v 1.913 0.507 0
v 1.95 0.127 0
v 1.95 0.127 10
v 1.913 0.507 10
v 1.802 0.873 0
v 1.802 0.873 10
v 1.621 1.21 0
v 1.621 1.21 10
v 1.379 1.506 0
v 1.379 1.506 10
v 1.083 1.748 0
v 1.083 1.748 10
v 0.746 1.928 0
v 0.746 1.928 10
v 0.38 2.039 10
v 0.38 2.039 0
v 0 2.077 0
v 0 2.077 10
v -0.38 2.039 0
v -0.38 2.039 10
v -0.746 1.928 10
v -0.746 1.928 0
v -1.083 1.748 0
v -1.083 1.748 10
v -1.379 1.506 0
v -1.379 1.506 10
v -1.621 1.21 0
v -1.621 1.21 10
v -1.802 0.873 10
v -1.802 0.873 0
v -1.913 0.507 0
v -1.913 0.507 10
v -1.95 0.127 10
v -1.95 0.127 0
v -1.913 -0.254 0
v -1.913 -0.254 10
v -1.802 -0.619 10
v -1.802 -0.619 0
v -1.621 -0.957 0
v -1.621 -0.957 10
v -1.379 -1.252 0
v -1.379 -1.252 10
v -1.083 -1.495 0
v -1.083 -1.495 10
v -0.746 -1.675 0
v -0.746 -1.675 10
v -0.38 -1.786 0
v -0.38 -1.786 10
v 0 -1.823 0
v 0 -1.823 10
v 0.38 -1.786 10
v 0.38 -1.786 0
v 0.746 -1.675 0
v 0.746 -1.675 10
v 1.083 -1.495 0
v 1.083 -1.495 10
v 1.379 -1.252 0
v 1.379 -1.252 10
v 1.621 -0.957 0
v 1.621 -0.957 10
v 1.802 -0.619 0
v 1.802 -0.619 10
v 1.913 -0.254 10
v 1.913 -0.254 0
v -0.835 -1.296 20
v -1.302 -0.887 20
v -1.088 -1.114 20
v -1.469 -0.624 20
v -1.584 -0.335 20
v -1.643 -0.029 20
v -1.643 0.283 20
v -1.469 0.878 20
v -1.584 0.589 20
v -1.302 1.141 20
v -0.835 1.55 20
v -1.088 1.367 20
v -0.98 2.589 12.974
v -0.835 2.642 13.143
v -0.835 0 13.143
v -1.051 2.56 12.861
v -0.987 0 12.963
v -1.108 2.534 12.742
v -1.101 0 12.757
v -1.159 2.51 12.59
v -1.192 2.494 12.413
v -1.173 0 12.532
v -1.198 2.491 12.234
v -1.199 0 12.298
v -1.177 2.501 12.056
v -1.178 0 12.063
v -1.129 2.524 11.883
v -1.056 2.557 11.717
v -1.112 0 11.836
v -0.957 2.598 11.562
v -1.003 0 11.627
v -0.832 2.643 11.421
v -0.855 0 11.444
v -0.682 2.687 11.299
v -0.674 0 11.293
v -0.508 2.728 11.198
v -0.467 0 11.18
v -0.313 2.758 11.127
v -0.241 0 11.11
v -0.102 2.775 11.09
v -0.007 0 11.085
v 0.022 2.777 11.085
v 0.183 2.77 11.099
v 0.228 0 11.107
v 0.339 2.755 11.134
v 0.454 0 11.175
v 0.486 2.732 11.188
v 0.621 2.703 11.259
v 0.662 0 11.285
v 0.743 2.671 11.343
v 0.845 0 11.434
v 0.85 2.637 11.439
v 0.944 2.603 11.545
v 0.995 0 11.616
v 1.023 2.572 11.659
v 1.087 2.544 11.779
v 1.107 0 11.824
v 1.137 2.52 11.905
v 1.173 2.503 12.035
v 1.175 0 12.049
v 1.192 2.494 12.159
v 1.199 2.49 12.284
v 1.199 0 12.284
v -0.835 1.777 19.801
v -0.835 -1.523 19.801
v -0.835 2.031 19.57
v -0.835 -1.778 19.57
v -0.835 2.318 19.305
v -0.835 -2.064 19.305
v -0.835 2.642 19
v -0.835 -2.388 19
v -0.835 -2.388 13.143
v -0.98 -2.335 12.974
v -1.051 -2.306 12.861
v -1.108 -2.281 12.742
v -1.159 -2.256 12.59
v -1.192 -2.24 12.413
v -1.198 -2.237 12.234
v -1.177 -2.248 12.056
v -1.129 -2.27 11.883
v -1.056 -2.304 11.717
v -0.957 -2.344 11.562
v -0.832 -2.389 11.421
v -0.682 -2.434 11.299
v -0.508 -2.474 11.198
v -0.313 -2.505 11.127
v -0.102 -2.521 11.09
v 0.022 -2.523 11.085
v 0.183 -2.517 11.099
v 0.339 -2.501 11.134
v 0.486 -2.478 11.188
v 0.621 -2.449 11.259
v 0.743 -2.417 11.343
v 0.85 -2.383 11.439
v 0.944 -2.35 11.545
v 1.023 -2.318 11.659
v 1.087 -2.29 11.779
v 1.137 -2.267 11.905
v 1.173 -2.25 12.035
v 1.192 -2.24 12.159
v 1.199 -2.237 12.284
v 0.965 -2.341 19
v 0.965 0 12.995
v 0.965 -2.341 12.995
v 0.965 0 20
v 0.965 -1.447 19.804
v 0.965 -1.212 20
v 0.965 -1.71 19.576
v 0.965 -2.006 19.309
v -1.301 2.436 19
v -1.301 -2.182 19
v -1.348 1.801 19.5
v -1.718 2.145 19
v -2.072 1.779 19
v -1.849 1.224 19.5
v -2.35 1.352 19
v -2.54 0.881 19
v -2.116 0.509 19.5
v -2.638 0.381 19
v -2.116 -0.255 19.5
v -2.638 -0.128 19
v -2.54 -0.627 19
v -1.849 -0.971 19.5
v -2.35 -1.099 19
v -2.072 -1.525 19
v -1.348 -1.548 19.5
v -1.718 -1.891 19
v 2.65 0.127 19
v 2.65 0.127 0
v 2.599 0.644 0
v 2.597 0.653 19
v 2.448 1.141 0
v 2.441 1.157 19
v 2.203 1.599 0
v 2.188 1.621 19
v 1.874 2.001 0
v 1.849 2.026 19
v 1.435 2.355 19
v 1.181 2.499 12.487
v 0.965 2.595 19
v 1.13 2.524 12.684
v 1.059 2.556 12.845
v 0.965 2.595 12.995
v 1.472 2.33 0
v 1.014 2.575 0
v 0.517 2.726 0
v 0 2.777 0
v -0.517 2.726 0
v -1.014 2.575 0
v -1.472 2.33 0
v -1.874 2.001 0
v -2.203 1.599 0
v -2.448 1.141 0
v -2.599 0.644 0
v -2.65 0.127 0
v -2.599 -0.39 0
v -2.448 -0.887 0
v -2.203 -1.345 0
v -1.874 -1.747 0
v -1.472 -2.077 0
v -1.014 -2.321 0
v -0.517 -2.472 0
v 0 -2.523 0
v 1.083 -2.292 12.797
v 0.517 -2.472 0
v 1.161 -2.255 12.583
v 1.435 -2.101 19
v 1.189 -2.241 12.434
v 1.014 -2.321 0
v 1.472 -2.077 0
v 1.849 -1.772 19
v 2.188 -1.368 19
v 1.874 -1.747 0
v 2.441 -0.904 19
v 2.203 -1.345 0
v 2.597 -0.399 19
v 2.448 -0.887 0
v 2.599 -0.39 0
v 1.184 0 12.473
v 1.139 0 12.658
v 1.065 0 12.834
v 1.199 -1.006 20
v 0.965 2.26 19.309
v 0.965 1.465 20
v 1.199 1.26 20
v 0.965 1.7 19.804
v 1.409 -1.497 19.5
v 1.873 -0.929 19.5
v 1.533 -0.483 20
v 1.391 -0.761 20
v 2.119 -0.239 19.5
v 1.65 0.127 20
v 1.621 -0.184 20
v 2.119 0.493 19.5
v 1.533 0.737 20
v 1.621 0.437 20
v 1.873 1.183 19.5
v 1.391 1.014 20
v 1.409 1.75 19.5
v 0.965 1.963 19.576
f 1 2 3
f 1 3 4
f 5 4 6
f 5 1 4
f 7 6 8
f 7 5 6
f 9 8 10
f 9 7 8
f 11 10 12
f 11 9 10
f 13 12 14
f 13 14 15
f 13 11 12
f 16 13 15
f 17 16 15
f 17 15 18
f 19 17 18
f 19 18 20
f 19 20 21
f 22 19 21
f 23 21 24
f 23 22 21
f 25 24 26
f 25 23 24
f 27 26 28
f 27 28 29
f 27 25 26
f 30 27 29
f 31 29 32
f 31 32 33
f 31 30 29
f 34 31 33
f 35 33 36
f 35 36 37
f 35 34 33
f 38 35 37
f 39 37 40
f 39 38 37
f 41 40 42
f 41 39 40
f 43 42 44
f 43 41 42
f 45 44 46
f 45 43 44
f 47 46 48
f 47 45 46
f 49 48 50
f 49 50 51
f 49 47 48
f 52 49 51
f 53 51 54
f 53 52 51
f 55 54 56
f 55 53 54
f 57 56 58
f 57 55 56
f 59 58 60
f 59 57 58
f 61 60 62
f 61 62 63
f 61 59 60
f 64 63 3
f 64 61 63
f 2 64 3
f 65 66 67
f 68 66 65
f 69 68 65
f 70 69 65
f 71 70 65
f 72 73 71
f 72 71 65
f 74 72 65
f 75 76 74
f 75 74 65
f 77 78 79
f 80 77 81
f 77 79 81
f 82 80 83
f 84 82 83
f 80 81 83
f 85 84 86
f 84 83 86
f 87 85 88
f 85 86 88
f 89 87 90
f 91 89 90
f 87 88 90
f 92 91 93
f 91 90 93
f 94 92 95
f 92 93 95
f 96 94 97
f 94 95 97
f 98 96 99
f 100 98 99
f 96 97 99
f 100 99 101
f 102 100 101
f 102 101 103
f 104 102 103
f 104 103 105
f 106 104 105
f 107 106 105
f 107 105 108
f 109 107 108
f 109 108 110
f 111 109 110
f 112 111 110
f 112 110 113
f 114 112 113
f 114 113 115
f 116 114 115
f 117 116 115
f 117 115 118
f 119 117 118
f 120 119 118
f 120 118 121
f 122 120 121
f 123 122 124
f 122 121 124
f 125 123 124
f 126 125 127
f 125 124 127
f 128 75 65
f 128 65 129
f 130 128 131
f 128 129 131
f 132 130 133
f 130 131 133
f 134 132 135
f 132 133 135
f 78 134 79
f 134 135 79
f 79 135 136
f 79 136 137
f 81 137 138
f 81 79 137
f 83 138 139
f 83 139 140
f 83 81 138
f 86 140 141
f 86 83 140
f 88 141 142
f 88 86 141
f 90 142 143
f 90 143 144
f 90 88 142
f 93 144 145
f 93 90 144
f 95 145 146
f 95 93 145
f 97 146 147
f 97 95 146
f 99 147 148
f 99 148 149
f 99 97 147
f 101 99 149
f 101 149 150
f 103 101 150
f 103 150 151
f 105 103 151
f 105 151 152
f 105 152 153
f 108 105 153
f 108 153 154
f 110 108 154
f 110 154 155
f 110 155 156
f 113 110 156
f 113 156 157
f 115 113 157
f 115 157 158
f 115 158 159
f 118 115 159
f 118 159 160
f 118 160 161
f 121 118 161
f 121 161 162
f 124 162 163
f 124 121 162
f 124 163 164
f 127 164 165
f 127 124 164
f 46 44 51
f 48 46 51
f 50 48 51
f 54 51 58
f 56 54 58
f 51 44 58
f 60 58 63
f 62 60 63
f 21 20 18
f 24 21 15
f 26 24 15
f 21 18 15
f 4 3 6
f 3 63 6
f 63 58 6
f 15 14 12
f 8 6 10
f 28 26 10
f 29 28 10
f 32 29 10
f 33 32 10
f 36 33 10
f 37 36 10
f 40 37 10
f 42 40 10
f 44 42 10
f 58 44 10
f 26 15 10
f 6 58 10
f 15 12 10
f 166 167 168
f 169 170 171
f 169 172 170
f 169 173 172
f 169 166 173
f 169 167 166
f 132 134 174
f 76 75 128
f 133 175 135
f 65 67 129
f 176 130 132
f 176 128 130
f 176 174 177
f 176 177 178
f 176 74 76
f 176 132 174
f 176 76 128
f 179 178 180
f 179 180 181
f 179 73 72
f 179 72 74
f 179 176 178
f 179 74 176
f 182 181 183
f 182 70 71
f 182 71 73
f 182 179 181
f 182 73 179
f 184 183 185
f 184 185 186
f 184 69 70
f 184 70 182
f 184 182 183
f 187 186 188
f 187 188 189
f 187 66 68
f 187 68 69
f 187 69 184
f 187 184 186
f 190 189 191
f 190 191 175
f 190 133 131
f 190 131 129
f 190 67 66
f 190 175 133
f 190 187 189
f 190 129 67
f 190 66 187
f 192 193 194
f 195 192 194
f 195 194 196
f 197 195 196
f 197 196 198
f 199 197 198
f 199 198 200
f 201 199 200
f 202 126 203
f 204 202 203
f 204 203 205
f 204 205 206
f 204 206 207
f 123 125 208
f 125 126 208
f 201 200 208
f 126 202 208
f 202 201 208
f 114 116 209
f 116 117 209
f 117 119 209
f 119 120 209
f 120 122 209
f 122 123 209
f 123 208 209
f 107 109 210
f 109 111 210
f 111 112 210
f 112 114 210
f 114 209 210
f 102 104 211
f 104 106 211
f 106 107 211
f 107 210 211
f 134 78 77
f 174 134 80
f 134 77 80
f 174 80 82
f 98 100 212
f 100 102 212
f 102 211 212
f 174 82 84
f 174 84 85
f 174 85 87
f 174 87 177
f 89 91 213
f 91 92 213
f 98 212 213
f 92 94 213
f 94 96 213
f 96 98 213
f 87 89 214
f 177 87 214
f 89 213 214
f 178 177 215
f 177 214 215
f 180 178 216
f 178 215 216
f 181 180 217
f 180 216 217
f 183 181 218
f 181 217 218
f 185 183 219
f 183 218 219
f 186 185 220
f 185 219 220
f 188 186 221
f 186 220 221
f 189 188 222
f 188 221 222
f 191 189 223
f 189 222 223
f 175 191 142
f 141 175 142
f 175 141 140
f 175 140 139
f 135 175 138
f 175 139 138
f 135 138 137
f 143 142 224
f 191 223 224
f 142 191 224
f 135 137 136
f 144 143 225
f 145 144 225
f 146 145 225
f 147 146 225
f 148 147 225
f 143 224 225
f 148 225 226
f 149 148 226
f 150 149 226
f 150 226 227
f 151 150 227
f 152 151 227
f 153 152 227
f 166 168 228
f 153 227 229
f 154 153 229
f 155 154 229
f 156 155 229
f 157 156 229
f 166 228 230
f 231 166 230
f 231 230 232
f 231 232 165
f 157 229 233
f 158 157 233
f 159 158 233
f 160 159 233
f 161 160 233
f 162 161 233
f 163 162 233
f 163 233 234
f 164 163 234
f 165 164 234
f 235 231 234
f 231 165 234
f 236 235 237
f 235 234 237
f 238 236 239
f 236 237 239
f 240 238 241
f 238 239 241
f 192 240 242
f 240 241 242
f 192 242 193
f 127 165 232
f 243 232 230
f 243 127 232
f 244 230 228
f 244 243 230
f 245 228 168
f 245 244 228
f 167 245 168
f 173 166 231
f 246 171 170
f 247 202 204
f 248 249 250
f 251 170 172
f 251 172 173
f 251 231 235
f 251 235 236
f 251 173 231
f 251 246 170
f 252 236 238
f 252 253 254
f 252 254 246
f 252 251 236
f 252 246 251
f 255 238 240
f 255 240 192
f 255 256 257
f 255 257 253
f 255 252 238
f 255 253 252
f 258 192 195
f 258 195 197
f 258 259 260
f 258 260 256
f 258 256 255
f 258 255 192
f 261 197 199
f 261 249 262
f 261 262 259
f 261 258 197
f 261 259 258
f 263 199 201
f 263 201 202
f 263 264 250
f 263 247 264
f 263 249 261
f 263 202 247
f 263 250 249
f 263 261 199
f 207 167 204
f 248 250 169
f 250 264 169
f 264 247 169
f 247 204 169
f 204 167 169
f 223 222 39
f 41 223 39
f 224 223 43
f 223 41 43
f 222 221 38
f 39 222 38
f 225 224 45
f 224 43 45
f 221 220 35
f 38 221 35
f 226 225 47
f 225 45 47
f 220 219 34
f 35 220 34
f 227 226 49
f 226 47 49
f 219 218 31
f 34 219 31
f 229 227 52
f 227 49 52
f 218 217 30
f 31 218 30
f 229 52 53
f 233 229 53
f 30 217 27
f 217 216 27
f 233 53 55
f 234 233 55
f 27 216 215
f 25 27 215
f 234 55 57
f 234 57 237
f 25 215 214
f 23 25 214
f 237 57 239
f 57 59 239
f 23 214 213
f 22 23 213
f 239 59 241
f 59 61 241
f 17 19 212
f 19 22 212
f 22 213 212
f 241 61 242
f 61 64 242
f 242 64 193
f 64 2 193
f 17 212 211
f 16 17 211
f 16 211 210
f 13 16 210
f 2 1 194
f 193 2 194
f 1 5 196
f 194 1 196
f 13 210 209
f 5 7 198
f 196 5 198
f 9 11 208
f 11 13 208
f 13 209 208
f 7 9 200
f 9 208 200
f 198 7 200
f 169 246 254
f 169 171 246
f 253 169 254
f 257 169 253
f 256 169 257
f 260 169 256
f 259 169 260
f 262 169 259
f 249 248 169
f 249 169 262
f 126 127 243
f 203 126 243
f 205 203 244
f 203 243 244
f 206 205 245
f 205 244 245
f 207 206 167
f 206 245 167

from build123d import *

# Parameters (mm, degrees)
F0_R     = 2.65
F0_R_2   = 1.95
F1_DEPTH = 10
F2_R     = 2.65
F3_DEPTH = 10
F4_SIZE  = 1
F6_DEPTH = 2.7778161572
F7_DEPTH = 2.5241839428


with BuildPart() as f1:
    # F0 (on Top) → F1 (new body)
    with BuildSketch(Plane.XY):
        with Locations((0, 0.1268161572)):
            Circle(F0_R)
        with Locations((0, 0.1268161572)):
            Circle(F0_R_2, mode=Mode.SUBTRACT)
    extrude(amount=F1_DEPTH)

    # F2 (on face) → F3 (join)
    with BuildSketch(Plane.XY.offset(10)):
        with Locations((0, 0.1268161572)):
            Circle(F2_R)
    extrude(amount=F3_DEPTH)

    # F4
    f4_edges = [f1.edges().sort_by_distance(p)[0] for p in [
        (-2.65, 0.126816, 20),
    ]]
    chamfer(f4_edges, length=F4_SIZE)

    # F5 (on Front) → F6 (cut, through all)
    with BuildSketch(Plane.XZ):
        with BuildLine():
            Line((-0.8353080657, 13.1434470012), (-0.8353080657, 12.2838566395))
            Line((-0.8353080657, 12.2838566395), (0.9646919343, 12.2838566395))
            Line((0.9646919343, 12.2838566395), (0.9646919343, 12.9951966612))
            ThreePointArc((0.9646919343, 12.9951966612), (0.0983848931, 13.4784090943), (-0.8353080657, 13.1434470012))
        make_face()
        with BuildLine():
            Line((0.9646919343, 12.2838566395), (-0.8353080657, 12.2838566395))
            Line((-0.8353080657, 12.2838566395), (-0.8353080657, 13.1434470012))
            ThreePointArc((-0.8353080657, 13.1434470012), (-0.4666032996, 11.1798111171), (1.1985971611, 12.2838566395))
            ThreePointArc((1.1985971611, 12.2838566395), (1.1386202546, 12.6582615946), (0.9646919343, 12.9951966612))
            Line((0.9646919343, 12.9951966612), (0.9646919343, 12.2838566395))
        make_face()
        with BuildLine():
            Line((-0.8353080657, 20.0238556888), (-0.8353080657, 13.1434470012))
            ThreePointArc((-0.8353080657, 13.1434470012), (0.0983848931, 13.4784090943), (0.9646919343, 12.9951966612))
            Line((0.9646919343, 12.9951966612), (0.9646919343, 20.0238556888))
            Line((0.9646919343, 20.0238556888), (-0.8353080657, 20.0238556888))
        make_face()
    extrude(amount=-F6_DEPTH, mode=Mode.SUBTRACT)

    # F7 (cut, through all): a face of the model
    f7_faces = [f1.faces().sort_by_distance(p)[0] for p in [
        (0.0489712617, 0, 15.4729630627),
    ]]
    extrude(f7_faces, amount=-F7_DEPTH, mode=Mode.SUBTRACT)


solid = f1.part
